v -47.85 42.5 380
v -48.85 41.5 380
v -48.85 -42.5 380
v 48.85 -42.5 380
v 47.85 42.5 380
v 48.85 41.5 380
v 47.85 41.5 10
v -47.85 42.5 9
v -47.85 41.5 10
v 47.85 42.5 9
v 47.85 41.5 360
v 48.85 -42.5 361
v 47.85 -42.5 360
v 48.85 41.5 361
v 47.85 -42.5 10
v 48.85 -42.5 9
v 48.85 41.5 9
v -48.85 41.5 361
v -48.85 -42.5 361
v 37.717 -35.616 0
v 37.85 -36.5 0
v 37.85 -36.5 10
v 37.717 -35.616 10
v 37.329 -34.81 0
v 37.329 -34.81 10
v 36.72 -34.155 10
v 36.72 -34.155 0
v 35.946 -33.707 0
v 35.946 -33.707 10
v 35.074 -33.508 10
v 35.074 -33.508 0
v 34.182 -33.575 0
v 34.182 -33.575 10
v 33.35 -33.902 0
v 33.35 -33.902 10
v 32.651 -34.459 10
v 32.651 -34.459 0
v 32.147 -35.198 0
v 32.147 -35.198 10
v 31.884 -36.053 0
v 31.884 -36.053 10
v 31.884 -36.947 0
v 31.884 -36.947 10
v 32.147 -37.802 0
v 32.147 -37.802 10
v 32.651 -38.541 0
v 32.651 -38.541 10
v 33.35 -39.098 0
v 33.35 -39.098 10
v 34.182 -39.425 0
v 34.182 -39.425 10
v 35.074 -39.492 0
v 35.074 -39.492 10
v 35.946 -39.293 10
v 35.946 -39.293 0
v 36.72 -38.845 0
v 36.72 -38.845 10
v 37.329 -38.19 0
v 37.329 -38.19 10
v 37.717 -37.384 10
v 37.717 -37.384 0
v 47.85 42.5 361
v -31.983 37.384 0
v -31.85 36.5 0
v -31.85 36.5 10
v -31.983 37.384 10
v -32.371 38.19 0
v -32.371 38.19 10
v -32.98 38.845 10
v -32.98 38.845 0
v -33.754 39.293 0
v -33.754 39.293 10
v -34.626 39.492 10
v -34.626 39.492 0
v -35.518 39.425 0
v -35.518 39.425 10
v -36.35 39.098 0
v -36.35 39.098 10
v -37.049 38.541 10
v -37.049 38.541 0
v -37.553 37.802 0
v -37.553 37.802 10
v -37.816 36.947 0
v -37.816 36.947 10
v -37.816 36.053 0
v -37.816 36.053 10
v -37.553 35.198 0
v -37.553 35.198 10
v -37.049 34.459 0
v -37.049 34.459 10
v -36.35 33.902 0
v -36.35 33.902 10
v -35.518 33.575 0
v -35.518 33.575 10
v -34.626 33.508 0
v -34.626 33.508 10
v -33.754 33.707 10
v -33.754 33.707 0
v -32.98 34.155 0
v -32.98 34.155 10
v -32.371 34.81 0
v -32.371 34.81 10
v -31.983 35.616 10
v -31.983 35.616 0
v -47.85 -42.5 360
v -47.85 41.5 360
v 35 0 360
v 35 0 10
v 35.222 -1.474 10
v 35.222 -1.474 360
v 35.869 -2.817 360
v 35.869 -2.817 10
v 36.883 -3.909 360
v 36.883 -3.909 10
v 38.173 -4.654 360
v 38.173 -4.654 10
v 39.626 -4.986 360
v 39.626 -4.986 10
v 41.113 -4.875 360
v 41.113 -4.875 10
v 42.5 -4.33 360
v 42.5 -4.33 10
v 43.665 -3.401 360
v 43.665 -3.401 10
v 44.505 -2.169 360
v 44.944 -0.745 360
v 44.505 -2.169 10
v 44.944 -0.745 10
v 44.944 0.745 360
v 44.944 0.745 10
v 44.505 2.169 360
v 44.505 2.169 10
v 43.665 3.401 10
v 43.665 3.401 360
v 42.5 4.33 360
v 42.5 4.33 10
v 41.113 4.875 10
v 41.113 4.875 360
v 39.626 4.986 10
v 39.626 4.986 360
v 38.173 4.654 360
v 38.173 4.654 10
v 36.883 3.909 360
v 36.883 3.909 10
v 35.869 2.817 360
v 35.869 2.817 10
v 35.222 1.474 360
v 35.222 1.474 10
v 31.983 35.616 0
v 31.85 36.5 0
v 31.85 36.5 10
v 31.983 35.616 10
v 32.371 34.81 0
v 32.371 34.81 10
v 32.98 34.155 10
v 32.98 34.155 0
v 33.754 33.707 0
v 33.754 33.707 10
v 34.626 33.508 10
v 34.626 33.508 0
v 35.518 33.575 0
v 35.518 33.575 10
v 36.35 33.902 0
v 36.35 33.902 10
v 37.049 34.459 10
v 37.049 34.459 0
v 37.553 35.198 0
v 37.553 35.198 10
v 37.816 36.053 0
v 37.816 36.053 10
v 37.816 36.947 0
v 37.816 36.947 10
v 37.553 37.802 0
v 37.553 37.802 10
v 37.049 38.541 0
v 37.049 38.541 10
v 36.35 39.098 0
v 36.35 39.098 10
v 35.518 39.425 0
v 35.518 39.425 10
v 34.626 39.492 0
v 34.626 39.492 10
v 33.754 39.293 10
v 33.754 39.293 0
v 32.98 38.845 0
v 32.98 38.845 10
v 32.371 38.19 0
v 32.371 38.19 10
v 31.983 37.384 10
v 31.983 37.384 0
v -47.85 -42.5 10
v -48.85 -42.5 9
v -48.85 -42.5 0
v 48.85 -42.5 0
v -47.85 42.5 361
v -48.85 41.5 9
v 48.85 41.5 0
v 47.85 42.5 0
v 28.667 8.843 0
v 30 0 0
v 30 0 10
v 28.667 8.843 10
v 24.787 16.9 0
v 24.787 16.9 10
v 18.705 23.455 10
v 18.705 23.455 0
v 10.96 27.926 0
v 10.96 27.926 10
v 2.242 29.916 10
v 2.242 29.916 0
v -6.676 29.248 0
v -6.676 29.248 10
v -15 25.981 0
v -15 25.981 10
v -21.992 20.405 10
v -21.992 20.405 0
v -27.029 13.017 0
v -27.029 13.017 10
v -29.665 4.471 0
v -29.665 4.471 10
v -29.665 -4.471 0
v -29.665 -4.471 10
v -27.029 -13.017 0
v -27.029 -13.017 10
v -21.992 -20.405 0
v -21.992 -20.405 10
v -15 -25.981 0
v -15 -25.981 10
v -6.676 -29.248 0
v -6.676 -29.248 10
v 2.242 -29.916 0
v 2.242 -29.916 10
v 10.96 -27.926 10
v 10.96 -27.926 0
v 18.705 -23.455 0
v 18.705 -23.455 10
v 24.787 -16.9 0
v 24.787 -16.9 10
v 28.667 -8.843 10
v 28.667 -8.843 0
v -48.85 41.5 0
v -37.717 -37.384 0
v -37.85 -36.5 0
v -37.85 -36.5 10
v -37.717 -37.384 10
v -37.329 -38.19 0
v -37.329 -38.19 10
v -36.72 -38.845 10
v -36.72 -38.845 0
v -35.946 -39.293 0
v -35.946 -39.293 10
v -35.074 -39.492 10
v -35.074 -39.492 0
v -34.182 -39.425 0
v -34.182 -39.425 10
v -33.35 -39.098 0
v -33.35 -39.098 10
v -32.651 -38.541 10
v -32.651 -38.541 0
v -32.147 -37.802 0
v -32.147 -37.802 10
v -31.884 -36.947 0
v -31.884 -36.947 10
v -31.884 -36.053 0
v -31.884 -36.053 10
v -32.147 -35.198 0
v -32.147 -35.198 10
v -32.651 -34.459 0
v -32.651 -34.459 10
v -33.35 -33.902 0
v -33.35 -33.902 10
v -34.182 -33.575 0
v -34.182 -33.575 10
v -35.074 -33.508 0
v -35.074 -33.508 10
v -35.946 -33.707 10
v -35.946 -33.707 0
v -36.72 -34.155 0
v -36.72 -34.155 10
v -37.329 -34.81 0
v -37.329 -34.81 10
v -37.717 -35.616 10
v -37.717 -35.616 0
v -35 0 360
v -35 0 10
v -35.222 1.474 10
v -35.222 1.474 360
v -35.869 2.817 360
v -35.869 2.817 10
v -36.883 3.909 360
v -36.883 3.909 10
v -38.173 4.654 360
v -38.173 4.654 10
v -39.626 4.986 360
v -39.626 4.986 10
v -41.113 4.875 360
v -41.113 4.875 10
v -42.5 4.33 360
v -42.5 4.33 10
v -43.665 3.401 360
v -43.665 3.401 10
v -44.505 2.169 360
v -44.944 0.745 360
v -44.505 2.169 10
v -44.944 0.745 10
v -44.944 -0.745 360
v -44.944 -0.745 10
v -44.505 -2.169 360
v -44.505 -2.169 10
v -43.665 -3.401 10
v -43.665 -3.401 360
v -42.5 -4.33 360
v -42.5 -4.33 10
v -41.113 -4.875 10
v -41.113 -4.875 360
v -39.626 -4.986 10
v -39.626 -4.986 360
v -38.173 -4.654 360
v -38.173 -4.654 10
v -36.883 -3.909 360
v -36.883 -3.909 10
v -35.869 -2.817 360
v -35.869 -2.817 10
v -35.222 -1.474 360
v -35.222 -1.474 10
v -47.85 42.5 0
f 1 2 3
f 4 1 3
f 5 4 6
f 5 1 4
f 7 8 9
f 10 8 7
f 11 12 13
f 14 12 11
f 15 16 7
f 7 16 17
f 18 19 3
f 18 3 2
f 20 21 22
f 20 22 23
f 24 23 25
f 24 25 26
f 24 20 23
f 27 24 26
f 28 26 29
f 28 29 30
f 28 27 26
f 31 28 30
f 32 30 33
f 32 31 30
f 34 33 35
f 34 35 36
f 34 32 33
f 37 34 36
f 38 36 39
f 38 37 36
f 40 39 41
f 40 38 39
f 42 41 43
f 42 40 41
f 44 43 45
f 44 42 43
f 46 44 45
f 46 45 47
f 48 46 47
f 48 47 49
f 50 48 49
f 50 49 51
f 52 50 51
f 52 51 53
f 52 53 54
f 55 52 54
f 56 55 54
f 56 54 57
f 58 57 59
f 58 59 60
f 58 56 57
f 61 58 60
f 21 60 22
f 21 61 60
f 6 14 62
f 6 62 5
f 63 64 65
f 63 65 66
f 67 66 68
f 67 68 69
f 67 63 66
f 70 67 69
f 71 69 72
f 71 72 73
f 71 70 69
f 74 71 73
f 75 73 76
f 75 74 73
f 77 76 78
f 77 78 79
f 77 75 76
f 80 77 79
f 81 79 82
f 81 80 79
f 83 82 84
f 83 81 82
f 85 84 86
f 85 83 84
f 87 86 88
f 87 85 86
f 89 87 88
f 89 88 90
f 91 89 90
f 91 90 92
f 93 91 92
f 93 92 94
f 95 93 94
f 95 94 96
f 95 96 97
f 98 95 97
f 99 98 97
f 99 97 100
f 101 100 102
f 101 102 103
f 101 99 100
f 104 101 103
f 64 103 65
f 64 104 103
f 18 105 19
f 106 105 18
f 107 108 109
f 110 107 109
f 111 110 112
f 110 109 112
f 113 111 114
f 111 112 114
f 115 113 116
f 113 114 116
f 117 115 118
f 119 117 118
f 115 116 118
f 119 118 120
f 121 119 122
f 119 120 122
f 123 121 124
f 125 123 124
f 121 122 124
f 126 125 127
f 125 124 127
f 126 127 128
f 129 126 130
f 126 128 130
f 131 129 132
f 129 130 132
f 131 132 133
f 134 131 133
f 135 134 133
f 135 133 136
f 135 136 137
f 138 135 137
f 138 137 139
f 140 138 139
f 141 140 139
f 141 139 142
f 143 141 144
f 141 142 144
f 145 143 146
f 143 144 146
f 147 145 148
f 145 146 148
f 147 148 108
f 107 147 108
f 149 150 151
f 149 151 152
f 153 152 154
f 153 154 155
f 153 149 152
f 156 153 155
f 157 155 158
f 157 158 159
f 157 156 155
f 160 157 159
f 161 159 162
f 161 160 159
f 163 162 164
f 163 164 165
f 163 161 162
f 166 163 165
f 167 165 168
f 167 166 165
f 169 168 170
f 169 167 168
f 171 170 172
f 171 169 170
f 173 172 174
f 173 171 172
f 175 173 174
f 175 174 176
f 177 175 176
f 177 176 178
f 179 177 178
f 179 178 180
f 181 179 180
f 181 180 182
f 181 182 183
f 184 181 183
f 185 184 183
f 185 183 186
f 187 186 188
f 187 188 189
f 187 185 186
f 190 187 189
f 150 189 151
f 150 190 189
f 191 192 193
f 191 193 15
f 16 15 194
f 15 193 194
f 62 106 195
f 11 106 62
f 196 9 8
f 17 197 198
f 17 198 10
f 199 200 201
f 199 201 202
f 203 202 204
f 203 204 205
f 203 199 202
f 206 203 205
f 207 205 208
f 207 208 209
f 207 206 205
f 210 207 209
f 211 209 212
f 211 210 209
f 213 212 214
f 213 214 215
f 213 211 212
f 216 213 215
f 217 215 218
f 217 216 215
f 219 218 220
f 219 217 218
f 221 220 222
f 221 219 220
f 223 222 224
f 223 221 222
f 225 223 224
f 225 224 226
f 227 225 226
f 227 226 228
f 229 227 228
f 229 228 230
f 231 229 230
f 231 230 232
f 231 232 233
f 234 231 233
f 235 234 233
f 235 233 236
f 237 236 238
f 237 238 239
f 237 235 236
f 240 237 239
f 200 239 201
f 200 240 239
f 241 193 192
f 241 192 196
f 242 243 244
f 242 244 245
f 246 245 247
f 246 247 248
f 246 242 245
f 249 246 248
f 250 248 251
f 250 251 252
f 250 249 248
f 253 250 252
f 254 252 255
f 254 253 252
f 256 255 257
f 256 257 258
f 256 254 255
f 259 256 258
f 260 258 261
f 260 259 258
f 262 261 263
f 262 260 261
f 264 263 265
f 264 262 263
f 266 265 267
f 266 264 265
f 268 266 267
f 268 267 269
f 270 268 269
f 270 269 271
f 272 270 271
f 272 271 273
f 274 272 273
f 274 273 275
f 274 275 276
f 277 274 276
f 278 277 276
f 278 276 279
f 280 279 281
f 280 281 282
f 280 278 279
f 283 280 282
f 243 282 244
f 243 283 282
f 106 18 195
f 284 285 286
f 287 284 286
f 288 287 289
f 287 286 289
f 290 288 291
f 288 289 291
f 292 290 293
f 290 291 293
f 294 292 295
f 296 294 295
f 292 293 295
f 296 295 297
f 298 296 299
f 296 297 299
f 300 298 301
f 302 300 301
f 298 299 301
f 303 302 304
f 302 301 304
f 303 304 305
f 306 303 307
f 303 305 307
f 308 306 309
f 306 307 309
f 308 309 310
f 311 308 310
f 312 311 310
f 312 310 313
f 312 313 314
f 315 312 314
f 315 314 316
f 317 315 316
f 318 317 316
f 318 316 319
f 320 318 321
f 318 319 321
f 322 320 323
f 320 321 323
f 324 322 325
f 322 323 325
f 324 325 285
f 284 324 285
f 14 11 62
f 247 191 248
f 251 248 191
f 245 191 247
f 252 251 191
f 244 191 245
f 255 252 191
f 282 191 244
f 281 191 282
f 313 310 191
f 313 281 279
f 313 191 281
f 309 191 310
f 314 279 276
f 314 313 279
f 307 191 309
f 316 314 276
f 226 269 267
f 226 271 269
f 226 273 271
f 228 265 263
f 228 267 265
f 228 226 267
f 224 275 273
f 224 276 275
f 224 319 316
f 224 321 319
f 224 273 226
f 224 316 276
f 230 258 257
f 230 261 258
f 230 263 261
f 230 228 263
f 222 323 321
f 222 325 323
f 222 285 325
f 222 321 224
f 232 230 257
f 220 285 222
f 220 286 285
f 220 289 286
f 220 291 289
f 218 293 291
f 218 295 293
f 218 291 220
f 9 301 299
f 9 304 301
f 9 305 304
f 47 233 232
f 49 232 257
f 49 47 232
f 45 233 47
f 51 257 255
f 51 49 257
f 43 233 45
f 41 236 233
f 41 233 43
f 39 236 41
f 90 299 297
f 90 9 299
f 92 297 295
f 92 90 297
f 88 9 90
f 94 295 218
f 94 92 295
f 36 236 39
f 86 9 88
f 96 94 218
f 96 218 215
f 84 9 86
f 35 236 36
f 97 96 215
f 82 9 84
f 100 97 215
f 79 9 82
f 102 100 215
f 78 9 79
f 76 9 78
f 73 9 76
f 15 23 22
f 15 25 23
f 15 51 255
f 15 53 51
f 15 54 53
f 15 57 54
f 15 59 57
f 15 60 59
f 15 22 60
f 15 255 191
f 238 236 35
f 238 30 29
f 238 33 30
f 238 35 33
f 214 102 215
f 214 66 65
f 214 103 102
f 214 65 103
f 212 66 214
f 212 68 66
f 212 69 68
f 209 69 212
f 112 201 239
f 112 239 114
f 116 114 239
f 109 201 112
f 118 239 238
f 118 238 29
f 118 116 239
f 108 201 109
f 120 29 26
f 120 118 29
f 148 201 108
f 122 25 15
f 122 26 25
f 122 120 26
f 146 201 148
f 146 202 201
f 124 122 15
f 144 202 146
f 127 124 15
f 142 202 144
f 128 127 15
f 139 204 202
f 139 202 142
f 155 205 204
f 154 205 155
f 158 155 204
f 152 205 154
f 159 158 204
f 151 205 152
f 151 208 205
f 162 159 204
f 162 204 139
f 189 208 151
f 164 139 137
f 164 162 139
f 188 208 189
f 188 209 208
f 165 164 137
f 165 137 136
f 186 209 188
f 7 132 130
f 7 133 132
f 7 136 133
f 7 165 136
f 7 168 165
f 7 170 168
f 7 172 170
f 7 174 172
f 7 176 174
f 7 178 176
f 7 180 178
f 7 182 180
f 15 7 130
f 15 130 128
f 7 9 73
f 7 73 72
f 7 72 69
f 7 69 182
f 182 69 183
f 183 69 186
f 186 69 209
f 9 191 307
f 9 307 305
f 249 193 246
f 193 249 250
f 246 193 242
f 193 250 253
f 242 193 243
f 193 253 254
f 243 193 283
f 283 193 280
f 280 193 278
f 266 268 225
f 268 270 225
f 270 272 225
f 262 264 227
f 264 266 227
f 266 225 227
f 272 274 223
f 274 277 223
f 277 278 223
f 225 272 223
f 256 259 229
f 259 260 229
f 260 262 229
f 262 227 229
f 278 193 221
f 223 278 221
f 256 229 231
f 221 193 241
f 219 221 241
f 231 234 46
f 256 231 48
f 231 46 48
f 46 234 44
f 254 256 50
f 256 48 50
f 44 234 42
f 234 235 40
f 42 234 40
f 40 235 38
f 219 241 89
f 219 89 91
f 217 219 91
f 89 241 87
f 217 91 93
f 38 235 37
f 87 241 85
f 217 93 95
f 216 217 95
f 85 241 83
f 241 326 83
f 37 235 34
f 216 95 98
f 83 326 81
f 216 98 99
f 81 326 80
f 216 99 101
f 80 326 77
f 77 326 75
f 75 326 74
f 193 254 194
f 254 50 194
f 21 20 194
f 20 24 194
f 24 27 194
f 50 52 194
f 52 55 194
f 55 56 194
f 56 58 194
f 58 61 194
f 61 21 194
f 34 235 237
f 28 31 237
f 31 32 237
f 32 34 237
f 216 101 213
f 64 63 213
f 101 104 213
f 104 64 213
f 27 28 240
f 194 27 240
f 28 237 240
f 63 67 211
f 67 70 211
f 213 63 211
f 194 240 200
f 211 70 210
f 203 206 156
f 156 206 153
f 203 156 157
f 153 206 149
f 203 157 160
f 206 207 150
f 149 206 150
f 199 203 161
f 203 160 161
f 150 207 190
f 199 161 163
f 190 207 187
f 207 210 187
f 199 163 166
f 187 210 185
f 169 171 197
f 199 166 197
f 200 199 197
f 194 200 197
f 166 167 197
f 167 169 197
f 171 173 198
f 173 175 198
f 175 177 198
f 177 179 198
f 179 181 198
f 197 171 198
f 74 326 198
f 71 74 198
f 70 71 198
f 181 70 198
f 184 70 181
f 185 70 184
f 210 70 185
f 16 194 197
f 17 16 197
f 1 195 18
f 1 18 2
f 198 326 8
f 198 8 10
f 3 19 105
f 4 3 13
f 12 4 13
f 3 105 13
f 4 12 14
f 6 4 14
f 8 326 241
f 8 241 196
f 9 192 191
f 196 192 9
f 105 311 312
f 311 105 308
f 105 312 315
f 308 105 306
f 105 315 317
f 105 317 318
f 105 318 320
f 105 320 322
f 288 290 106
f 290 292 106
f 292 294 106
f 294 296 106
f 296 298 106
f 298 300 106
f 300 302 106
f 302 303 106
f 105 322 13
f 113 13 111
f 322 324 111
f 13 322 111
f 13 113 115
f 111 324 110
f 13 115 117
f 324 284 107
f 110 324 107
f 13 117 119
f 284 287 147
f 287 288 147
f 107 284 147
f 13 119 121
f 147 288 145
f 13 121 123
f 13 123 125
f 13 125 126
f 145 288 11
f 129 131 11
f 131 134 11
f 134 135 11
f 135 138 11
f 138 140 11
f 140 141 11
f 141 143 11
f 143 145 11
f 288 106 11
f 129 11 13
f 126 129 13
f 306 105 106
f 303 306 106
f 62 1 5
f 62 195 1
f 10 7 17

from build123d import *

# Parameters (mm, degrees)
CROQUIS1_W              = 97.7
CROQUIS1_H              = 85
CROQUIS1_R              = 3
CROQUIS1_R_2            = 30
SALIENTE_EXTRUIR1_DEPTH = 10
CROQUIS2_R              = 5
SALIENTE_EXTRUIR2_DEPTH = 350
CROQUIS3_W              = 97.7
CROQUIS3_H              = 85
SALIENTE_EXTRUIR3_DEPTH = 20
CHAFL_N1_SIZE           = 1


with BuildPart() as part:
    # Croquis1 → Saliente-Extruir1 (new body)
    with BuildSketch(Plane.XY):
        Rectangle(CROQUIS1_W, CROQUIS1_H)
        with Locations((-34.85, 36.5)):
            Circle(CROQUIS1_R, mode=Mode.SUBTRACT)
        Circle(CROQUIS1_R_2, mode=Mode.SUBTRACT)
        with Locations(Location((34.85, 36.5, 0), (0, 0, 180))):
            Circle(CROQUIS1_R, mode=Mode.SUBTRACT)
        with Locations((34.85, -36.5)):
            Circle(CROQUIS1_R, mode=Mode.SUBTRACT)
        with Locations(Location((-34.85, -36.5, 0), (0, 0, 180))):
            Circle(CROQUIS1_R, mode=Mode.SUBTRACT)
    extrude(amount=SALIENTE_EXTRUIR1_DEPTH)

    # Croquis2 → Saliente-Extruir2 (add)
    with BuildSketch(Plane.XY.offset(10)):
        with Locations((-40, 0)):
            Circle(CROQUIS2_R)
        with Locations(Location((40, 0, 0), (0, 0, 180))):
            Circle(CROQUIS2_R)
    extrude(amount=SALIENTE_EXTRUIR2_DEPTH)

    # Croquis3 → Saliente-Extruir3 (add)
    with BuildSketch(Plane.XY.offset(360)):
        Rectangle(CROQUIS3_W, CROQUIS3_H)
    extrude(amount=SALIENTE_EXTRUIR3_DEPTH)

    # Chaflán1
    chafl_n1_edges = [part.edges().sort_by_distance(p)[0] for p in [
        (48.85, 0, 10),
        (0, 42.5, 10),
        (-48.85, 0, 360),
        (-48.85, 42.5, 370),
        (48.85, 0, 360),
        (0, 42.5, 360),
        (48.85, 42.5, 370),
        (-48.85, 0, 10),
        (-48.85, 42.5, 5),
        (48.85, 42.5, 5),
    ]]
    chamfer(chafl_n1_edges, length=CHAFL_N1_SIZE)


solid = part.part
